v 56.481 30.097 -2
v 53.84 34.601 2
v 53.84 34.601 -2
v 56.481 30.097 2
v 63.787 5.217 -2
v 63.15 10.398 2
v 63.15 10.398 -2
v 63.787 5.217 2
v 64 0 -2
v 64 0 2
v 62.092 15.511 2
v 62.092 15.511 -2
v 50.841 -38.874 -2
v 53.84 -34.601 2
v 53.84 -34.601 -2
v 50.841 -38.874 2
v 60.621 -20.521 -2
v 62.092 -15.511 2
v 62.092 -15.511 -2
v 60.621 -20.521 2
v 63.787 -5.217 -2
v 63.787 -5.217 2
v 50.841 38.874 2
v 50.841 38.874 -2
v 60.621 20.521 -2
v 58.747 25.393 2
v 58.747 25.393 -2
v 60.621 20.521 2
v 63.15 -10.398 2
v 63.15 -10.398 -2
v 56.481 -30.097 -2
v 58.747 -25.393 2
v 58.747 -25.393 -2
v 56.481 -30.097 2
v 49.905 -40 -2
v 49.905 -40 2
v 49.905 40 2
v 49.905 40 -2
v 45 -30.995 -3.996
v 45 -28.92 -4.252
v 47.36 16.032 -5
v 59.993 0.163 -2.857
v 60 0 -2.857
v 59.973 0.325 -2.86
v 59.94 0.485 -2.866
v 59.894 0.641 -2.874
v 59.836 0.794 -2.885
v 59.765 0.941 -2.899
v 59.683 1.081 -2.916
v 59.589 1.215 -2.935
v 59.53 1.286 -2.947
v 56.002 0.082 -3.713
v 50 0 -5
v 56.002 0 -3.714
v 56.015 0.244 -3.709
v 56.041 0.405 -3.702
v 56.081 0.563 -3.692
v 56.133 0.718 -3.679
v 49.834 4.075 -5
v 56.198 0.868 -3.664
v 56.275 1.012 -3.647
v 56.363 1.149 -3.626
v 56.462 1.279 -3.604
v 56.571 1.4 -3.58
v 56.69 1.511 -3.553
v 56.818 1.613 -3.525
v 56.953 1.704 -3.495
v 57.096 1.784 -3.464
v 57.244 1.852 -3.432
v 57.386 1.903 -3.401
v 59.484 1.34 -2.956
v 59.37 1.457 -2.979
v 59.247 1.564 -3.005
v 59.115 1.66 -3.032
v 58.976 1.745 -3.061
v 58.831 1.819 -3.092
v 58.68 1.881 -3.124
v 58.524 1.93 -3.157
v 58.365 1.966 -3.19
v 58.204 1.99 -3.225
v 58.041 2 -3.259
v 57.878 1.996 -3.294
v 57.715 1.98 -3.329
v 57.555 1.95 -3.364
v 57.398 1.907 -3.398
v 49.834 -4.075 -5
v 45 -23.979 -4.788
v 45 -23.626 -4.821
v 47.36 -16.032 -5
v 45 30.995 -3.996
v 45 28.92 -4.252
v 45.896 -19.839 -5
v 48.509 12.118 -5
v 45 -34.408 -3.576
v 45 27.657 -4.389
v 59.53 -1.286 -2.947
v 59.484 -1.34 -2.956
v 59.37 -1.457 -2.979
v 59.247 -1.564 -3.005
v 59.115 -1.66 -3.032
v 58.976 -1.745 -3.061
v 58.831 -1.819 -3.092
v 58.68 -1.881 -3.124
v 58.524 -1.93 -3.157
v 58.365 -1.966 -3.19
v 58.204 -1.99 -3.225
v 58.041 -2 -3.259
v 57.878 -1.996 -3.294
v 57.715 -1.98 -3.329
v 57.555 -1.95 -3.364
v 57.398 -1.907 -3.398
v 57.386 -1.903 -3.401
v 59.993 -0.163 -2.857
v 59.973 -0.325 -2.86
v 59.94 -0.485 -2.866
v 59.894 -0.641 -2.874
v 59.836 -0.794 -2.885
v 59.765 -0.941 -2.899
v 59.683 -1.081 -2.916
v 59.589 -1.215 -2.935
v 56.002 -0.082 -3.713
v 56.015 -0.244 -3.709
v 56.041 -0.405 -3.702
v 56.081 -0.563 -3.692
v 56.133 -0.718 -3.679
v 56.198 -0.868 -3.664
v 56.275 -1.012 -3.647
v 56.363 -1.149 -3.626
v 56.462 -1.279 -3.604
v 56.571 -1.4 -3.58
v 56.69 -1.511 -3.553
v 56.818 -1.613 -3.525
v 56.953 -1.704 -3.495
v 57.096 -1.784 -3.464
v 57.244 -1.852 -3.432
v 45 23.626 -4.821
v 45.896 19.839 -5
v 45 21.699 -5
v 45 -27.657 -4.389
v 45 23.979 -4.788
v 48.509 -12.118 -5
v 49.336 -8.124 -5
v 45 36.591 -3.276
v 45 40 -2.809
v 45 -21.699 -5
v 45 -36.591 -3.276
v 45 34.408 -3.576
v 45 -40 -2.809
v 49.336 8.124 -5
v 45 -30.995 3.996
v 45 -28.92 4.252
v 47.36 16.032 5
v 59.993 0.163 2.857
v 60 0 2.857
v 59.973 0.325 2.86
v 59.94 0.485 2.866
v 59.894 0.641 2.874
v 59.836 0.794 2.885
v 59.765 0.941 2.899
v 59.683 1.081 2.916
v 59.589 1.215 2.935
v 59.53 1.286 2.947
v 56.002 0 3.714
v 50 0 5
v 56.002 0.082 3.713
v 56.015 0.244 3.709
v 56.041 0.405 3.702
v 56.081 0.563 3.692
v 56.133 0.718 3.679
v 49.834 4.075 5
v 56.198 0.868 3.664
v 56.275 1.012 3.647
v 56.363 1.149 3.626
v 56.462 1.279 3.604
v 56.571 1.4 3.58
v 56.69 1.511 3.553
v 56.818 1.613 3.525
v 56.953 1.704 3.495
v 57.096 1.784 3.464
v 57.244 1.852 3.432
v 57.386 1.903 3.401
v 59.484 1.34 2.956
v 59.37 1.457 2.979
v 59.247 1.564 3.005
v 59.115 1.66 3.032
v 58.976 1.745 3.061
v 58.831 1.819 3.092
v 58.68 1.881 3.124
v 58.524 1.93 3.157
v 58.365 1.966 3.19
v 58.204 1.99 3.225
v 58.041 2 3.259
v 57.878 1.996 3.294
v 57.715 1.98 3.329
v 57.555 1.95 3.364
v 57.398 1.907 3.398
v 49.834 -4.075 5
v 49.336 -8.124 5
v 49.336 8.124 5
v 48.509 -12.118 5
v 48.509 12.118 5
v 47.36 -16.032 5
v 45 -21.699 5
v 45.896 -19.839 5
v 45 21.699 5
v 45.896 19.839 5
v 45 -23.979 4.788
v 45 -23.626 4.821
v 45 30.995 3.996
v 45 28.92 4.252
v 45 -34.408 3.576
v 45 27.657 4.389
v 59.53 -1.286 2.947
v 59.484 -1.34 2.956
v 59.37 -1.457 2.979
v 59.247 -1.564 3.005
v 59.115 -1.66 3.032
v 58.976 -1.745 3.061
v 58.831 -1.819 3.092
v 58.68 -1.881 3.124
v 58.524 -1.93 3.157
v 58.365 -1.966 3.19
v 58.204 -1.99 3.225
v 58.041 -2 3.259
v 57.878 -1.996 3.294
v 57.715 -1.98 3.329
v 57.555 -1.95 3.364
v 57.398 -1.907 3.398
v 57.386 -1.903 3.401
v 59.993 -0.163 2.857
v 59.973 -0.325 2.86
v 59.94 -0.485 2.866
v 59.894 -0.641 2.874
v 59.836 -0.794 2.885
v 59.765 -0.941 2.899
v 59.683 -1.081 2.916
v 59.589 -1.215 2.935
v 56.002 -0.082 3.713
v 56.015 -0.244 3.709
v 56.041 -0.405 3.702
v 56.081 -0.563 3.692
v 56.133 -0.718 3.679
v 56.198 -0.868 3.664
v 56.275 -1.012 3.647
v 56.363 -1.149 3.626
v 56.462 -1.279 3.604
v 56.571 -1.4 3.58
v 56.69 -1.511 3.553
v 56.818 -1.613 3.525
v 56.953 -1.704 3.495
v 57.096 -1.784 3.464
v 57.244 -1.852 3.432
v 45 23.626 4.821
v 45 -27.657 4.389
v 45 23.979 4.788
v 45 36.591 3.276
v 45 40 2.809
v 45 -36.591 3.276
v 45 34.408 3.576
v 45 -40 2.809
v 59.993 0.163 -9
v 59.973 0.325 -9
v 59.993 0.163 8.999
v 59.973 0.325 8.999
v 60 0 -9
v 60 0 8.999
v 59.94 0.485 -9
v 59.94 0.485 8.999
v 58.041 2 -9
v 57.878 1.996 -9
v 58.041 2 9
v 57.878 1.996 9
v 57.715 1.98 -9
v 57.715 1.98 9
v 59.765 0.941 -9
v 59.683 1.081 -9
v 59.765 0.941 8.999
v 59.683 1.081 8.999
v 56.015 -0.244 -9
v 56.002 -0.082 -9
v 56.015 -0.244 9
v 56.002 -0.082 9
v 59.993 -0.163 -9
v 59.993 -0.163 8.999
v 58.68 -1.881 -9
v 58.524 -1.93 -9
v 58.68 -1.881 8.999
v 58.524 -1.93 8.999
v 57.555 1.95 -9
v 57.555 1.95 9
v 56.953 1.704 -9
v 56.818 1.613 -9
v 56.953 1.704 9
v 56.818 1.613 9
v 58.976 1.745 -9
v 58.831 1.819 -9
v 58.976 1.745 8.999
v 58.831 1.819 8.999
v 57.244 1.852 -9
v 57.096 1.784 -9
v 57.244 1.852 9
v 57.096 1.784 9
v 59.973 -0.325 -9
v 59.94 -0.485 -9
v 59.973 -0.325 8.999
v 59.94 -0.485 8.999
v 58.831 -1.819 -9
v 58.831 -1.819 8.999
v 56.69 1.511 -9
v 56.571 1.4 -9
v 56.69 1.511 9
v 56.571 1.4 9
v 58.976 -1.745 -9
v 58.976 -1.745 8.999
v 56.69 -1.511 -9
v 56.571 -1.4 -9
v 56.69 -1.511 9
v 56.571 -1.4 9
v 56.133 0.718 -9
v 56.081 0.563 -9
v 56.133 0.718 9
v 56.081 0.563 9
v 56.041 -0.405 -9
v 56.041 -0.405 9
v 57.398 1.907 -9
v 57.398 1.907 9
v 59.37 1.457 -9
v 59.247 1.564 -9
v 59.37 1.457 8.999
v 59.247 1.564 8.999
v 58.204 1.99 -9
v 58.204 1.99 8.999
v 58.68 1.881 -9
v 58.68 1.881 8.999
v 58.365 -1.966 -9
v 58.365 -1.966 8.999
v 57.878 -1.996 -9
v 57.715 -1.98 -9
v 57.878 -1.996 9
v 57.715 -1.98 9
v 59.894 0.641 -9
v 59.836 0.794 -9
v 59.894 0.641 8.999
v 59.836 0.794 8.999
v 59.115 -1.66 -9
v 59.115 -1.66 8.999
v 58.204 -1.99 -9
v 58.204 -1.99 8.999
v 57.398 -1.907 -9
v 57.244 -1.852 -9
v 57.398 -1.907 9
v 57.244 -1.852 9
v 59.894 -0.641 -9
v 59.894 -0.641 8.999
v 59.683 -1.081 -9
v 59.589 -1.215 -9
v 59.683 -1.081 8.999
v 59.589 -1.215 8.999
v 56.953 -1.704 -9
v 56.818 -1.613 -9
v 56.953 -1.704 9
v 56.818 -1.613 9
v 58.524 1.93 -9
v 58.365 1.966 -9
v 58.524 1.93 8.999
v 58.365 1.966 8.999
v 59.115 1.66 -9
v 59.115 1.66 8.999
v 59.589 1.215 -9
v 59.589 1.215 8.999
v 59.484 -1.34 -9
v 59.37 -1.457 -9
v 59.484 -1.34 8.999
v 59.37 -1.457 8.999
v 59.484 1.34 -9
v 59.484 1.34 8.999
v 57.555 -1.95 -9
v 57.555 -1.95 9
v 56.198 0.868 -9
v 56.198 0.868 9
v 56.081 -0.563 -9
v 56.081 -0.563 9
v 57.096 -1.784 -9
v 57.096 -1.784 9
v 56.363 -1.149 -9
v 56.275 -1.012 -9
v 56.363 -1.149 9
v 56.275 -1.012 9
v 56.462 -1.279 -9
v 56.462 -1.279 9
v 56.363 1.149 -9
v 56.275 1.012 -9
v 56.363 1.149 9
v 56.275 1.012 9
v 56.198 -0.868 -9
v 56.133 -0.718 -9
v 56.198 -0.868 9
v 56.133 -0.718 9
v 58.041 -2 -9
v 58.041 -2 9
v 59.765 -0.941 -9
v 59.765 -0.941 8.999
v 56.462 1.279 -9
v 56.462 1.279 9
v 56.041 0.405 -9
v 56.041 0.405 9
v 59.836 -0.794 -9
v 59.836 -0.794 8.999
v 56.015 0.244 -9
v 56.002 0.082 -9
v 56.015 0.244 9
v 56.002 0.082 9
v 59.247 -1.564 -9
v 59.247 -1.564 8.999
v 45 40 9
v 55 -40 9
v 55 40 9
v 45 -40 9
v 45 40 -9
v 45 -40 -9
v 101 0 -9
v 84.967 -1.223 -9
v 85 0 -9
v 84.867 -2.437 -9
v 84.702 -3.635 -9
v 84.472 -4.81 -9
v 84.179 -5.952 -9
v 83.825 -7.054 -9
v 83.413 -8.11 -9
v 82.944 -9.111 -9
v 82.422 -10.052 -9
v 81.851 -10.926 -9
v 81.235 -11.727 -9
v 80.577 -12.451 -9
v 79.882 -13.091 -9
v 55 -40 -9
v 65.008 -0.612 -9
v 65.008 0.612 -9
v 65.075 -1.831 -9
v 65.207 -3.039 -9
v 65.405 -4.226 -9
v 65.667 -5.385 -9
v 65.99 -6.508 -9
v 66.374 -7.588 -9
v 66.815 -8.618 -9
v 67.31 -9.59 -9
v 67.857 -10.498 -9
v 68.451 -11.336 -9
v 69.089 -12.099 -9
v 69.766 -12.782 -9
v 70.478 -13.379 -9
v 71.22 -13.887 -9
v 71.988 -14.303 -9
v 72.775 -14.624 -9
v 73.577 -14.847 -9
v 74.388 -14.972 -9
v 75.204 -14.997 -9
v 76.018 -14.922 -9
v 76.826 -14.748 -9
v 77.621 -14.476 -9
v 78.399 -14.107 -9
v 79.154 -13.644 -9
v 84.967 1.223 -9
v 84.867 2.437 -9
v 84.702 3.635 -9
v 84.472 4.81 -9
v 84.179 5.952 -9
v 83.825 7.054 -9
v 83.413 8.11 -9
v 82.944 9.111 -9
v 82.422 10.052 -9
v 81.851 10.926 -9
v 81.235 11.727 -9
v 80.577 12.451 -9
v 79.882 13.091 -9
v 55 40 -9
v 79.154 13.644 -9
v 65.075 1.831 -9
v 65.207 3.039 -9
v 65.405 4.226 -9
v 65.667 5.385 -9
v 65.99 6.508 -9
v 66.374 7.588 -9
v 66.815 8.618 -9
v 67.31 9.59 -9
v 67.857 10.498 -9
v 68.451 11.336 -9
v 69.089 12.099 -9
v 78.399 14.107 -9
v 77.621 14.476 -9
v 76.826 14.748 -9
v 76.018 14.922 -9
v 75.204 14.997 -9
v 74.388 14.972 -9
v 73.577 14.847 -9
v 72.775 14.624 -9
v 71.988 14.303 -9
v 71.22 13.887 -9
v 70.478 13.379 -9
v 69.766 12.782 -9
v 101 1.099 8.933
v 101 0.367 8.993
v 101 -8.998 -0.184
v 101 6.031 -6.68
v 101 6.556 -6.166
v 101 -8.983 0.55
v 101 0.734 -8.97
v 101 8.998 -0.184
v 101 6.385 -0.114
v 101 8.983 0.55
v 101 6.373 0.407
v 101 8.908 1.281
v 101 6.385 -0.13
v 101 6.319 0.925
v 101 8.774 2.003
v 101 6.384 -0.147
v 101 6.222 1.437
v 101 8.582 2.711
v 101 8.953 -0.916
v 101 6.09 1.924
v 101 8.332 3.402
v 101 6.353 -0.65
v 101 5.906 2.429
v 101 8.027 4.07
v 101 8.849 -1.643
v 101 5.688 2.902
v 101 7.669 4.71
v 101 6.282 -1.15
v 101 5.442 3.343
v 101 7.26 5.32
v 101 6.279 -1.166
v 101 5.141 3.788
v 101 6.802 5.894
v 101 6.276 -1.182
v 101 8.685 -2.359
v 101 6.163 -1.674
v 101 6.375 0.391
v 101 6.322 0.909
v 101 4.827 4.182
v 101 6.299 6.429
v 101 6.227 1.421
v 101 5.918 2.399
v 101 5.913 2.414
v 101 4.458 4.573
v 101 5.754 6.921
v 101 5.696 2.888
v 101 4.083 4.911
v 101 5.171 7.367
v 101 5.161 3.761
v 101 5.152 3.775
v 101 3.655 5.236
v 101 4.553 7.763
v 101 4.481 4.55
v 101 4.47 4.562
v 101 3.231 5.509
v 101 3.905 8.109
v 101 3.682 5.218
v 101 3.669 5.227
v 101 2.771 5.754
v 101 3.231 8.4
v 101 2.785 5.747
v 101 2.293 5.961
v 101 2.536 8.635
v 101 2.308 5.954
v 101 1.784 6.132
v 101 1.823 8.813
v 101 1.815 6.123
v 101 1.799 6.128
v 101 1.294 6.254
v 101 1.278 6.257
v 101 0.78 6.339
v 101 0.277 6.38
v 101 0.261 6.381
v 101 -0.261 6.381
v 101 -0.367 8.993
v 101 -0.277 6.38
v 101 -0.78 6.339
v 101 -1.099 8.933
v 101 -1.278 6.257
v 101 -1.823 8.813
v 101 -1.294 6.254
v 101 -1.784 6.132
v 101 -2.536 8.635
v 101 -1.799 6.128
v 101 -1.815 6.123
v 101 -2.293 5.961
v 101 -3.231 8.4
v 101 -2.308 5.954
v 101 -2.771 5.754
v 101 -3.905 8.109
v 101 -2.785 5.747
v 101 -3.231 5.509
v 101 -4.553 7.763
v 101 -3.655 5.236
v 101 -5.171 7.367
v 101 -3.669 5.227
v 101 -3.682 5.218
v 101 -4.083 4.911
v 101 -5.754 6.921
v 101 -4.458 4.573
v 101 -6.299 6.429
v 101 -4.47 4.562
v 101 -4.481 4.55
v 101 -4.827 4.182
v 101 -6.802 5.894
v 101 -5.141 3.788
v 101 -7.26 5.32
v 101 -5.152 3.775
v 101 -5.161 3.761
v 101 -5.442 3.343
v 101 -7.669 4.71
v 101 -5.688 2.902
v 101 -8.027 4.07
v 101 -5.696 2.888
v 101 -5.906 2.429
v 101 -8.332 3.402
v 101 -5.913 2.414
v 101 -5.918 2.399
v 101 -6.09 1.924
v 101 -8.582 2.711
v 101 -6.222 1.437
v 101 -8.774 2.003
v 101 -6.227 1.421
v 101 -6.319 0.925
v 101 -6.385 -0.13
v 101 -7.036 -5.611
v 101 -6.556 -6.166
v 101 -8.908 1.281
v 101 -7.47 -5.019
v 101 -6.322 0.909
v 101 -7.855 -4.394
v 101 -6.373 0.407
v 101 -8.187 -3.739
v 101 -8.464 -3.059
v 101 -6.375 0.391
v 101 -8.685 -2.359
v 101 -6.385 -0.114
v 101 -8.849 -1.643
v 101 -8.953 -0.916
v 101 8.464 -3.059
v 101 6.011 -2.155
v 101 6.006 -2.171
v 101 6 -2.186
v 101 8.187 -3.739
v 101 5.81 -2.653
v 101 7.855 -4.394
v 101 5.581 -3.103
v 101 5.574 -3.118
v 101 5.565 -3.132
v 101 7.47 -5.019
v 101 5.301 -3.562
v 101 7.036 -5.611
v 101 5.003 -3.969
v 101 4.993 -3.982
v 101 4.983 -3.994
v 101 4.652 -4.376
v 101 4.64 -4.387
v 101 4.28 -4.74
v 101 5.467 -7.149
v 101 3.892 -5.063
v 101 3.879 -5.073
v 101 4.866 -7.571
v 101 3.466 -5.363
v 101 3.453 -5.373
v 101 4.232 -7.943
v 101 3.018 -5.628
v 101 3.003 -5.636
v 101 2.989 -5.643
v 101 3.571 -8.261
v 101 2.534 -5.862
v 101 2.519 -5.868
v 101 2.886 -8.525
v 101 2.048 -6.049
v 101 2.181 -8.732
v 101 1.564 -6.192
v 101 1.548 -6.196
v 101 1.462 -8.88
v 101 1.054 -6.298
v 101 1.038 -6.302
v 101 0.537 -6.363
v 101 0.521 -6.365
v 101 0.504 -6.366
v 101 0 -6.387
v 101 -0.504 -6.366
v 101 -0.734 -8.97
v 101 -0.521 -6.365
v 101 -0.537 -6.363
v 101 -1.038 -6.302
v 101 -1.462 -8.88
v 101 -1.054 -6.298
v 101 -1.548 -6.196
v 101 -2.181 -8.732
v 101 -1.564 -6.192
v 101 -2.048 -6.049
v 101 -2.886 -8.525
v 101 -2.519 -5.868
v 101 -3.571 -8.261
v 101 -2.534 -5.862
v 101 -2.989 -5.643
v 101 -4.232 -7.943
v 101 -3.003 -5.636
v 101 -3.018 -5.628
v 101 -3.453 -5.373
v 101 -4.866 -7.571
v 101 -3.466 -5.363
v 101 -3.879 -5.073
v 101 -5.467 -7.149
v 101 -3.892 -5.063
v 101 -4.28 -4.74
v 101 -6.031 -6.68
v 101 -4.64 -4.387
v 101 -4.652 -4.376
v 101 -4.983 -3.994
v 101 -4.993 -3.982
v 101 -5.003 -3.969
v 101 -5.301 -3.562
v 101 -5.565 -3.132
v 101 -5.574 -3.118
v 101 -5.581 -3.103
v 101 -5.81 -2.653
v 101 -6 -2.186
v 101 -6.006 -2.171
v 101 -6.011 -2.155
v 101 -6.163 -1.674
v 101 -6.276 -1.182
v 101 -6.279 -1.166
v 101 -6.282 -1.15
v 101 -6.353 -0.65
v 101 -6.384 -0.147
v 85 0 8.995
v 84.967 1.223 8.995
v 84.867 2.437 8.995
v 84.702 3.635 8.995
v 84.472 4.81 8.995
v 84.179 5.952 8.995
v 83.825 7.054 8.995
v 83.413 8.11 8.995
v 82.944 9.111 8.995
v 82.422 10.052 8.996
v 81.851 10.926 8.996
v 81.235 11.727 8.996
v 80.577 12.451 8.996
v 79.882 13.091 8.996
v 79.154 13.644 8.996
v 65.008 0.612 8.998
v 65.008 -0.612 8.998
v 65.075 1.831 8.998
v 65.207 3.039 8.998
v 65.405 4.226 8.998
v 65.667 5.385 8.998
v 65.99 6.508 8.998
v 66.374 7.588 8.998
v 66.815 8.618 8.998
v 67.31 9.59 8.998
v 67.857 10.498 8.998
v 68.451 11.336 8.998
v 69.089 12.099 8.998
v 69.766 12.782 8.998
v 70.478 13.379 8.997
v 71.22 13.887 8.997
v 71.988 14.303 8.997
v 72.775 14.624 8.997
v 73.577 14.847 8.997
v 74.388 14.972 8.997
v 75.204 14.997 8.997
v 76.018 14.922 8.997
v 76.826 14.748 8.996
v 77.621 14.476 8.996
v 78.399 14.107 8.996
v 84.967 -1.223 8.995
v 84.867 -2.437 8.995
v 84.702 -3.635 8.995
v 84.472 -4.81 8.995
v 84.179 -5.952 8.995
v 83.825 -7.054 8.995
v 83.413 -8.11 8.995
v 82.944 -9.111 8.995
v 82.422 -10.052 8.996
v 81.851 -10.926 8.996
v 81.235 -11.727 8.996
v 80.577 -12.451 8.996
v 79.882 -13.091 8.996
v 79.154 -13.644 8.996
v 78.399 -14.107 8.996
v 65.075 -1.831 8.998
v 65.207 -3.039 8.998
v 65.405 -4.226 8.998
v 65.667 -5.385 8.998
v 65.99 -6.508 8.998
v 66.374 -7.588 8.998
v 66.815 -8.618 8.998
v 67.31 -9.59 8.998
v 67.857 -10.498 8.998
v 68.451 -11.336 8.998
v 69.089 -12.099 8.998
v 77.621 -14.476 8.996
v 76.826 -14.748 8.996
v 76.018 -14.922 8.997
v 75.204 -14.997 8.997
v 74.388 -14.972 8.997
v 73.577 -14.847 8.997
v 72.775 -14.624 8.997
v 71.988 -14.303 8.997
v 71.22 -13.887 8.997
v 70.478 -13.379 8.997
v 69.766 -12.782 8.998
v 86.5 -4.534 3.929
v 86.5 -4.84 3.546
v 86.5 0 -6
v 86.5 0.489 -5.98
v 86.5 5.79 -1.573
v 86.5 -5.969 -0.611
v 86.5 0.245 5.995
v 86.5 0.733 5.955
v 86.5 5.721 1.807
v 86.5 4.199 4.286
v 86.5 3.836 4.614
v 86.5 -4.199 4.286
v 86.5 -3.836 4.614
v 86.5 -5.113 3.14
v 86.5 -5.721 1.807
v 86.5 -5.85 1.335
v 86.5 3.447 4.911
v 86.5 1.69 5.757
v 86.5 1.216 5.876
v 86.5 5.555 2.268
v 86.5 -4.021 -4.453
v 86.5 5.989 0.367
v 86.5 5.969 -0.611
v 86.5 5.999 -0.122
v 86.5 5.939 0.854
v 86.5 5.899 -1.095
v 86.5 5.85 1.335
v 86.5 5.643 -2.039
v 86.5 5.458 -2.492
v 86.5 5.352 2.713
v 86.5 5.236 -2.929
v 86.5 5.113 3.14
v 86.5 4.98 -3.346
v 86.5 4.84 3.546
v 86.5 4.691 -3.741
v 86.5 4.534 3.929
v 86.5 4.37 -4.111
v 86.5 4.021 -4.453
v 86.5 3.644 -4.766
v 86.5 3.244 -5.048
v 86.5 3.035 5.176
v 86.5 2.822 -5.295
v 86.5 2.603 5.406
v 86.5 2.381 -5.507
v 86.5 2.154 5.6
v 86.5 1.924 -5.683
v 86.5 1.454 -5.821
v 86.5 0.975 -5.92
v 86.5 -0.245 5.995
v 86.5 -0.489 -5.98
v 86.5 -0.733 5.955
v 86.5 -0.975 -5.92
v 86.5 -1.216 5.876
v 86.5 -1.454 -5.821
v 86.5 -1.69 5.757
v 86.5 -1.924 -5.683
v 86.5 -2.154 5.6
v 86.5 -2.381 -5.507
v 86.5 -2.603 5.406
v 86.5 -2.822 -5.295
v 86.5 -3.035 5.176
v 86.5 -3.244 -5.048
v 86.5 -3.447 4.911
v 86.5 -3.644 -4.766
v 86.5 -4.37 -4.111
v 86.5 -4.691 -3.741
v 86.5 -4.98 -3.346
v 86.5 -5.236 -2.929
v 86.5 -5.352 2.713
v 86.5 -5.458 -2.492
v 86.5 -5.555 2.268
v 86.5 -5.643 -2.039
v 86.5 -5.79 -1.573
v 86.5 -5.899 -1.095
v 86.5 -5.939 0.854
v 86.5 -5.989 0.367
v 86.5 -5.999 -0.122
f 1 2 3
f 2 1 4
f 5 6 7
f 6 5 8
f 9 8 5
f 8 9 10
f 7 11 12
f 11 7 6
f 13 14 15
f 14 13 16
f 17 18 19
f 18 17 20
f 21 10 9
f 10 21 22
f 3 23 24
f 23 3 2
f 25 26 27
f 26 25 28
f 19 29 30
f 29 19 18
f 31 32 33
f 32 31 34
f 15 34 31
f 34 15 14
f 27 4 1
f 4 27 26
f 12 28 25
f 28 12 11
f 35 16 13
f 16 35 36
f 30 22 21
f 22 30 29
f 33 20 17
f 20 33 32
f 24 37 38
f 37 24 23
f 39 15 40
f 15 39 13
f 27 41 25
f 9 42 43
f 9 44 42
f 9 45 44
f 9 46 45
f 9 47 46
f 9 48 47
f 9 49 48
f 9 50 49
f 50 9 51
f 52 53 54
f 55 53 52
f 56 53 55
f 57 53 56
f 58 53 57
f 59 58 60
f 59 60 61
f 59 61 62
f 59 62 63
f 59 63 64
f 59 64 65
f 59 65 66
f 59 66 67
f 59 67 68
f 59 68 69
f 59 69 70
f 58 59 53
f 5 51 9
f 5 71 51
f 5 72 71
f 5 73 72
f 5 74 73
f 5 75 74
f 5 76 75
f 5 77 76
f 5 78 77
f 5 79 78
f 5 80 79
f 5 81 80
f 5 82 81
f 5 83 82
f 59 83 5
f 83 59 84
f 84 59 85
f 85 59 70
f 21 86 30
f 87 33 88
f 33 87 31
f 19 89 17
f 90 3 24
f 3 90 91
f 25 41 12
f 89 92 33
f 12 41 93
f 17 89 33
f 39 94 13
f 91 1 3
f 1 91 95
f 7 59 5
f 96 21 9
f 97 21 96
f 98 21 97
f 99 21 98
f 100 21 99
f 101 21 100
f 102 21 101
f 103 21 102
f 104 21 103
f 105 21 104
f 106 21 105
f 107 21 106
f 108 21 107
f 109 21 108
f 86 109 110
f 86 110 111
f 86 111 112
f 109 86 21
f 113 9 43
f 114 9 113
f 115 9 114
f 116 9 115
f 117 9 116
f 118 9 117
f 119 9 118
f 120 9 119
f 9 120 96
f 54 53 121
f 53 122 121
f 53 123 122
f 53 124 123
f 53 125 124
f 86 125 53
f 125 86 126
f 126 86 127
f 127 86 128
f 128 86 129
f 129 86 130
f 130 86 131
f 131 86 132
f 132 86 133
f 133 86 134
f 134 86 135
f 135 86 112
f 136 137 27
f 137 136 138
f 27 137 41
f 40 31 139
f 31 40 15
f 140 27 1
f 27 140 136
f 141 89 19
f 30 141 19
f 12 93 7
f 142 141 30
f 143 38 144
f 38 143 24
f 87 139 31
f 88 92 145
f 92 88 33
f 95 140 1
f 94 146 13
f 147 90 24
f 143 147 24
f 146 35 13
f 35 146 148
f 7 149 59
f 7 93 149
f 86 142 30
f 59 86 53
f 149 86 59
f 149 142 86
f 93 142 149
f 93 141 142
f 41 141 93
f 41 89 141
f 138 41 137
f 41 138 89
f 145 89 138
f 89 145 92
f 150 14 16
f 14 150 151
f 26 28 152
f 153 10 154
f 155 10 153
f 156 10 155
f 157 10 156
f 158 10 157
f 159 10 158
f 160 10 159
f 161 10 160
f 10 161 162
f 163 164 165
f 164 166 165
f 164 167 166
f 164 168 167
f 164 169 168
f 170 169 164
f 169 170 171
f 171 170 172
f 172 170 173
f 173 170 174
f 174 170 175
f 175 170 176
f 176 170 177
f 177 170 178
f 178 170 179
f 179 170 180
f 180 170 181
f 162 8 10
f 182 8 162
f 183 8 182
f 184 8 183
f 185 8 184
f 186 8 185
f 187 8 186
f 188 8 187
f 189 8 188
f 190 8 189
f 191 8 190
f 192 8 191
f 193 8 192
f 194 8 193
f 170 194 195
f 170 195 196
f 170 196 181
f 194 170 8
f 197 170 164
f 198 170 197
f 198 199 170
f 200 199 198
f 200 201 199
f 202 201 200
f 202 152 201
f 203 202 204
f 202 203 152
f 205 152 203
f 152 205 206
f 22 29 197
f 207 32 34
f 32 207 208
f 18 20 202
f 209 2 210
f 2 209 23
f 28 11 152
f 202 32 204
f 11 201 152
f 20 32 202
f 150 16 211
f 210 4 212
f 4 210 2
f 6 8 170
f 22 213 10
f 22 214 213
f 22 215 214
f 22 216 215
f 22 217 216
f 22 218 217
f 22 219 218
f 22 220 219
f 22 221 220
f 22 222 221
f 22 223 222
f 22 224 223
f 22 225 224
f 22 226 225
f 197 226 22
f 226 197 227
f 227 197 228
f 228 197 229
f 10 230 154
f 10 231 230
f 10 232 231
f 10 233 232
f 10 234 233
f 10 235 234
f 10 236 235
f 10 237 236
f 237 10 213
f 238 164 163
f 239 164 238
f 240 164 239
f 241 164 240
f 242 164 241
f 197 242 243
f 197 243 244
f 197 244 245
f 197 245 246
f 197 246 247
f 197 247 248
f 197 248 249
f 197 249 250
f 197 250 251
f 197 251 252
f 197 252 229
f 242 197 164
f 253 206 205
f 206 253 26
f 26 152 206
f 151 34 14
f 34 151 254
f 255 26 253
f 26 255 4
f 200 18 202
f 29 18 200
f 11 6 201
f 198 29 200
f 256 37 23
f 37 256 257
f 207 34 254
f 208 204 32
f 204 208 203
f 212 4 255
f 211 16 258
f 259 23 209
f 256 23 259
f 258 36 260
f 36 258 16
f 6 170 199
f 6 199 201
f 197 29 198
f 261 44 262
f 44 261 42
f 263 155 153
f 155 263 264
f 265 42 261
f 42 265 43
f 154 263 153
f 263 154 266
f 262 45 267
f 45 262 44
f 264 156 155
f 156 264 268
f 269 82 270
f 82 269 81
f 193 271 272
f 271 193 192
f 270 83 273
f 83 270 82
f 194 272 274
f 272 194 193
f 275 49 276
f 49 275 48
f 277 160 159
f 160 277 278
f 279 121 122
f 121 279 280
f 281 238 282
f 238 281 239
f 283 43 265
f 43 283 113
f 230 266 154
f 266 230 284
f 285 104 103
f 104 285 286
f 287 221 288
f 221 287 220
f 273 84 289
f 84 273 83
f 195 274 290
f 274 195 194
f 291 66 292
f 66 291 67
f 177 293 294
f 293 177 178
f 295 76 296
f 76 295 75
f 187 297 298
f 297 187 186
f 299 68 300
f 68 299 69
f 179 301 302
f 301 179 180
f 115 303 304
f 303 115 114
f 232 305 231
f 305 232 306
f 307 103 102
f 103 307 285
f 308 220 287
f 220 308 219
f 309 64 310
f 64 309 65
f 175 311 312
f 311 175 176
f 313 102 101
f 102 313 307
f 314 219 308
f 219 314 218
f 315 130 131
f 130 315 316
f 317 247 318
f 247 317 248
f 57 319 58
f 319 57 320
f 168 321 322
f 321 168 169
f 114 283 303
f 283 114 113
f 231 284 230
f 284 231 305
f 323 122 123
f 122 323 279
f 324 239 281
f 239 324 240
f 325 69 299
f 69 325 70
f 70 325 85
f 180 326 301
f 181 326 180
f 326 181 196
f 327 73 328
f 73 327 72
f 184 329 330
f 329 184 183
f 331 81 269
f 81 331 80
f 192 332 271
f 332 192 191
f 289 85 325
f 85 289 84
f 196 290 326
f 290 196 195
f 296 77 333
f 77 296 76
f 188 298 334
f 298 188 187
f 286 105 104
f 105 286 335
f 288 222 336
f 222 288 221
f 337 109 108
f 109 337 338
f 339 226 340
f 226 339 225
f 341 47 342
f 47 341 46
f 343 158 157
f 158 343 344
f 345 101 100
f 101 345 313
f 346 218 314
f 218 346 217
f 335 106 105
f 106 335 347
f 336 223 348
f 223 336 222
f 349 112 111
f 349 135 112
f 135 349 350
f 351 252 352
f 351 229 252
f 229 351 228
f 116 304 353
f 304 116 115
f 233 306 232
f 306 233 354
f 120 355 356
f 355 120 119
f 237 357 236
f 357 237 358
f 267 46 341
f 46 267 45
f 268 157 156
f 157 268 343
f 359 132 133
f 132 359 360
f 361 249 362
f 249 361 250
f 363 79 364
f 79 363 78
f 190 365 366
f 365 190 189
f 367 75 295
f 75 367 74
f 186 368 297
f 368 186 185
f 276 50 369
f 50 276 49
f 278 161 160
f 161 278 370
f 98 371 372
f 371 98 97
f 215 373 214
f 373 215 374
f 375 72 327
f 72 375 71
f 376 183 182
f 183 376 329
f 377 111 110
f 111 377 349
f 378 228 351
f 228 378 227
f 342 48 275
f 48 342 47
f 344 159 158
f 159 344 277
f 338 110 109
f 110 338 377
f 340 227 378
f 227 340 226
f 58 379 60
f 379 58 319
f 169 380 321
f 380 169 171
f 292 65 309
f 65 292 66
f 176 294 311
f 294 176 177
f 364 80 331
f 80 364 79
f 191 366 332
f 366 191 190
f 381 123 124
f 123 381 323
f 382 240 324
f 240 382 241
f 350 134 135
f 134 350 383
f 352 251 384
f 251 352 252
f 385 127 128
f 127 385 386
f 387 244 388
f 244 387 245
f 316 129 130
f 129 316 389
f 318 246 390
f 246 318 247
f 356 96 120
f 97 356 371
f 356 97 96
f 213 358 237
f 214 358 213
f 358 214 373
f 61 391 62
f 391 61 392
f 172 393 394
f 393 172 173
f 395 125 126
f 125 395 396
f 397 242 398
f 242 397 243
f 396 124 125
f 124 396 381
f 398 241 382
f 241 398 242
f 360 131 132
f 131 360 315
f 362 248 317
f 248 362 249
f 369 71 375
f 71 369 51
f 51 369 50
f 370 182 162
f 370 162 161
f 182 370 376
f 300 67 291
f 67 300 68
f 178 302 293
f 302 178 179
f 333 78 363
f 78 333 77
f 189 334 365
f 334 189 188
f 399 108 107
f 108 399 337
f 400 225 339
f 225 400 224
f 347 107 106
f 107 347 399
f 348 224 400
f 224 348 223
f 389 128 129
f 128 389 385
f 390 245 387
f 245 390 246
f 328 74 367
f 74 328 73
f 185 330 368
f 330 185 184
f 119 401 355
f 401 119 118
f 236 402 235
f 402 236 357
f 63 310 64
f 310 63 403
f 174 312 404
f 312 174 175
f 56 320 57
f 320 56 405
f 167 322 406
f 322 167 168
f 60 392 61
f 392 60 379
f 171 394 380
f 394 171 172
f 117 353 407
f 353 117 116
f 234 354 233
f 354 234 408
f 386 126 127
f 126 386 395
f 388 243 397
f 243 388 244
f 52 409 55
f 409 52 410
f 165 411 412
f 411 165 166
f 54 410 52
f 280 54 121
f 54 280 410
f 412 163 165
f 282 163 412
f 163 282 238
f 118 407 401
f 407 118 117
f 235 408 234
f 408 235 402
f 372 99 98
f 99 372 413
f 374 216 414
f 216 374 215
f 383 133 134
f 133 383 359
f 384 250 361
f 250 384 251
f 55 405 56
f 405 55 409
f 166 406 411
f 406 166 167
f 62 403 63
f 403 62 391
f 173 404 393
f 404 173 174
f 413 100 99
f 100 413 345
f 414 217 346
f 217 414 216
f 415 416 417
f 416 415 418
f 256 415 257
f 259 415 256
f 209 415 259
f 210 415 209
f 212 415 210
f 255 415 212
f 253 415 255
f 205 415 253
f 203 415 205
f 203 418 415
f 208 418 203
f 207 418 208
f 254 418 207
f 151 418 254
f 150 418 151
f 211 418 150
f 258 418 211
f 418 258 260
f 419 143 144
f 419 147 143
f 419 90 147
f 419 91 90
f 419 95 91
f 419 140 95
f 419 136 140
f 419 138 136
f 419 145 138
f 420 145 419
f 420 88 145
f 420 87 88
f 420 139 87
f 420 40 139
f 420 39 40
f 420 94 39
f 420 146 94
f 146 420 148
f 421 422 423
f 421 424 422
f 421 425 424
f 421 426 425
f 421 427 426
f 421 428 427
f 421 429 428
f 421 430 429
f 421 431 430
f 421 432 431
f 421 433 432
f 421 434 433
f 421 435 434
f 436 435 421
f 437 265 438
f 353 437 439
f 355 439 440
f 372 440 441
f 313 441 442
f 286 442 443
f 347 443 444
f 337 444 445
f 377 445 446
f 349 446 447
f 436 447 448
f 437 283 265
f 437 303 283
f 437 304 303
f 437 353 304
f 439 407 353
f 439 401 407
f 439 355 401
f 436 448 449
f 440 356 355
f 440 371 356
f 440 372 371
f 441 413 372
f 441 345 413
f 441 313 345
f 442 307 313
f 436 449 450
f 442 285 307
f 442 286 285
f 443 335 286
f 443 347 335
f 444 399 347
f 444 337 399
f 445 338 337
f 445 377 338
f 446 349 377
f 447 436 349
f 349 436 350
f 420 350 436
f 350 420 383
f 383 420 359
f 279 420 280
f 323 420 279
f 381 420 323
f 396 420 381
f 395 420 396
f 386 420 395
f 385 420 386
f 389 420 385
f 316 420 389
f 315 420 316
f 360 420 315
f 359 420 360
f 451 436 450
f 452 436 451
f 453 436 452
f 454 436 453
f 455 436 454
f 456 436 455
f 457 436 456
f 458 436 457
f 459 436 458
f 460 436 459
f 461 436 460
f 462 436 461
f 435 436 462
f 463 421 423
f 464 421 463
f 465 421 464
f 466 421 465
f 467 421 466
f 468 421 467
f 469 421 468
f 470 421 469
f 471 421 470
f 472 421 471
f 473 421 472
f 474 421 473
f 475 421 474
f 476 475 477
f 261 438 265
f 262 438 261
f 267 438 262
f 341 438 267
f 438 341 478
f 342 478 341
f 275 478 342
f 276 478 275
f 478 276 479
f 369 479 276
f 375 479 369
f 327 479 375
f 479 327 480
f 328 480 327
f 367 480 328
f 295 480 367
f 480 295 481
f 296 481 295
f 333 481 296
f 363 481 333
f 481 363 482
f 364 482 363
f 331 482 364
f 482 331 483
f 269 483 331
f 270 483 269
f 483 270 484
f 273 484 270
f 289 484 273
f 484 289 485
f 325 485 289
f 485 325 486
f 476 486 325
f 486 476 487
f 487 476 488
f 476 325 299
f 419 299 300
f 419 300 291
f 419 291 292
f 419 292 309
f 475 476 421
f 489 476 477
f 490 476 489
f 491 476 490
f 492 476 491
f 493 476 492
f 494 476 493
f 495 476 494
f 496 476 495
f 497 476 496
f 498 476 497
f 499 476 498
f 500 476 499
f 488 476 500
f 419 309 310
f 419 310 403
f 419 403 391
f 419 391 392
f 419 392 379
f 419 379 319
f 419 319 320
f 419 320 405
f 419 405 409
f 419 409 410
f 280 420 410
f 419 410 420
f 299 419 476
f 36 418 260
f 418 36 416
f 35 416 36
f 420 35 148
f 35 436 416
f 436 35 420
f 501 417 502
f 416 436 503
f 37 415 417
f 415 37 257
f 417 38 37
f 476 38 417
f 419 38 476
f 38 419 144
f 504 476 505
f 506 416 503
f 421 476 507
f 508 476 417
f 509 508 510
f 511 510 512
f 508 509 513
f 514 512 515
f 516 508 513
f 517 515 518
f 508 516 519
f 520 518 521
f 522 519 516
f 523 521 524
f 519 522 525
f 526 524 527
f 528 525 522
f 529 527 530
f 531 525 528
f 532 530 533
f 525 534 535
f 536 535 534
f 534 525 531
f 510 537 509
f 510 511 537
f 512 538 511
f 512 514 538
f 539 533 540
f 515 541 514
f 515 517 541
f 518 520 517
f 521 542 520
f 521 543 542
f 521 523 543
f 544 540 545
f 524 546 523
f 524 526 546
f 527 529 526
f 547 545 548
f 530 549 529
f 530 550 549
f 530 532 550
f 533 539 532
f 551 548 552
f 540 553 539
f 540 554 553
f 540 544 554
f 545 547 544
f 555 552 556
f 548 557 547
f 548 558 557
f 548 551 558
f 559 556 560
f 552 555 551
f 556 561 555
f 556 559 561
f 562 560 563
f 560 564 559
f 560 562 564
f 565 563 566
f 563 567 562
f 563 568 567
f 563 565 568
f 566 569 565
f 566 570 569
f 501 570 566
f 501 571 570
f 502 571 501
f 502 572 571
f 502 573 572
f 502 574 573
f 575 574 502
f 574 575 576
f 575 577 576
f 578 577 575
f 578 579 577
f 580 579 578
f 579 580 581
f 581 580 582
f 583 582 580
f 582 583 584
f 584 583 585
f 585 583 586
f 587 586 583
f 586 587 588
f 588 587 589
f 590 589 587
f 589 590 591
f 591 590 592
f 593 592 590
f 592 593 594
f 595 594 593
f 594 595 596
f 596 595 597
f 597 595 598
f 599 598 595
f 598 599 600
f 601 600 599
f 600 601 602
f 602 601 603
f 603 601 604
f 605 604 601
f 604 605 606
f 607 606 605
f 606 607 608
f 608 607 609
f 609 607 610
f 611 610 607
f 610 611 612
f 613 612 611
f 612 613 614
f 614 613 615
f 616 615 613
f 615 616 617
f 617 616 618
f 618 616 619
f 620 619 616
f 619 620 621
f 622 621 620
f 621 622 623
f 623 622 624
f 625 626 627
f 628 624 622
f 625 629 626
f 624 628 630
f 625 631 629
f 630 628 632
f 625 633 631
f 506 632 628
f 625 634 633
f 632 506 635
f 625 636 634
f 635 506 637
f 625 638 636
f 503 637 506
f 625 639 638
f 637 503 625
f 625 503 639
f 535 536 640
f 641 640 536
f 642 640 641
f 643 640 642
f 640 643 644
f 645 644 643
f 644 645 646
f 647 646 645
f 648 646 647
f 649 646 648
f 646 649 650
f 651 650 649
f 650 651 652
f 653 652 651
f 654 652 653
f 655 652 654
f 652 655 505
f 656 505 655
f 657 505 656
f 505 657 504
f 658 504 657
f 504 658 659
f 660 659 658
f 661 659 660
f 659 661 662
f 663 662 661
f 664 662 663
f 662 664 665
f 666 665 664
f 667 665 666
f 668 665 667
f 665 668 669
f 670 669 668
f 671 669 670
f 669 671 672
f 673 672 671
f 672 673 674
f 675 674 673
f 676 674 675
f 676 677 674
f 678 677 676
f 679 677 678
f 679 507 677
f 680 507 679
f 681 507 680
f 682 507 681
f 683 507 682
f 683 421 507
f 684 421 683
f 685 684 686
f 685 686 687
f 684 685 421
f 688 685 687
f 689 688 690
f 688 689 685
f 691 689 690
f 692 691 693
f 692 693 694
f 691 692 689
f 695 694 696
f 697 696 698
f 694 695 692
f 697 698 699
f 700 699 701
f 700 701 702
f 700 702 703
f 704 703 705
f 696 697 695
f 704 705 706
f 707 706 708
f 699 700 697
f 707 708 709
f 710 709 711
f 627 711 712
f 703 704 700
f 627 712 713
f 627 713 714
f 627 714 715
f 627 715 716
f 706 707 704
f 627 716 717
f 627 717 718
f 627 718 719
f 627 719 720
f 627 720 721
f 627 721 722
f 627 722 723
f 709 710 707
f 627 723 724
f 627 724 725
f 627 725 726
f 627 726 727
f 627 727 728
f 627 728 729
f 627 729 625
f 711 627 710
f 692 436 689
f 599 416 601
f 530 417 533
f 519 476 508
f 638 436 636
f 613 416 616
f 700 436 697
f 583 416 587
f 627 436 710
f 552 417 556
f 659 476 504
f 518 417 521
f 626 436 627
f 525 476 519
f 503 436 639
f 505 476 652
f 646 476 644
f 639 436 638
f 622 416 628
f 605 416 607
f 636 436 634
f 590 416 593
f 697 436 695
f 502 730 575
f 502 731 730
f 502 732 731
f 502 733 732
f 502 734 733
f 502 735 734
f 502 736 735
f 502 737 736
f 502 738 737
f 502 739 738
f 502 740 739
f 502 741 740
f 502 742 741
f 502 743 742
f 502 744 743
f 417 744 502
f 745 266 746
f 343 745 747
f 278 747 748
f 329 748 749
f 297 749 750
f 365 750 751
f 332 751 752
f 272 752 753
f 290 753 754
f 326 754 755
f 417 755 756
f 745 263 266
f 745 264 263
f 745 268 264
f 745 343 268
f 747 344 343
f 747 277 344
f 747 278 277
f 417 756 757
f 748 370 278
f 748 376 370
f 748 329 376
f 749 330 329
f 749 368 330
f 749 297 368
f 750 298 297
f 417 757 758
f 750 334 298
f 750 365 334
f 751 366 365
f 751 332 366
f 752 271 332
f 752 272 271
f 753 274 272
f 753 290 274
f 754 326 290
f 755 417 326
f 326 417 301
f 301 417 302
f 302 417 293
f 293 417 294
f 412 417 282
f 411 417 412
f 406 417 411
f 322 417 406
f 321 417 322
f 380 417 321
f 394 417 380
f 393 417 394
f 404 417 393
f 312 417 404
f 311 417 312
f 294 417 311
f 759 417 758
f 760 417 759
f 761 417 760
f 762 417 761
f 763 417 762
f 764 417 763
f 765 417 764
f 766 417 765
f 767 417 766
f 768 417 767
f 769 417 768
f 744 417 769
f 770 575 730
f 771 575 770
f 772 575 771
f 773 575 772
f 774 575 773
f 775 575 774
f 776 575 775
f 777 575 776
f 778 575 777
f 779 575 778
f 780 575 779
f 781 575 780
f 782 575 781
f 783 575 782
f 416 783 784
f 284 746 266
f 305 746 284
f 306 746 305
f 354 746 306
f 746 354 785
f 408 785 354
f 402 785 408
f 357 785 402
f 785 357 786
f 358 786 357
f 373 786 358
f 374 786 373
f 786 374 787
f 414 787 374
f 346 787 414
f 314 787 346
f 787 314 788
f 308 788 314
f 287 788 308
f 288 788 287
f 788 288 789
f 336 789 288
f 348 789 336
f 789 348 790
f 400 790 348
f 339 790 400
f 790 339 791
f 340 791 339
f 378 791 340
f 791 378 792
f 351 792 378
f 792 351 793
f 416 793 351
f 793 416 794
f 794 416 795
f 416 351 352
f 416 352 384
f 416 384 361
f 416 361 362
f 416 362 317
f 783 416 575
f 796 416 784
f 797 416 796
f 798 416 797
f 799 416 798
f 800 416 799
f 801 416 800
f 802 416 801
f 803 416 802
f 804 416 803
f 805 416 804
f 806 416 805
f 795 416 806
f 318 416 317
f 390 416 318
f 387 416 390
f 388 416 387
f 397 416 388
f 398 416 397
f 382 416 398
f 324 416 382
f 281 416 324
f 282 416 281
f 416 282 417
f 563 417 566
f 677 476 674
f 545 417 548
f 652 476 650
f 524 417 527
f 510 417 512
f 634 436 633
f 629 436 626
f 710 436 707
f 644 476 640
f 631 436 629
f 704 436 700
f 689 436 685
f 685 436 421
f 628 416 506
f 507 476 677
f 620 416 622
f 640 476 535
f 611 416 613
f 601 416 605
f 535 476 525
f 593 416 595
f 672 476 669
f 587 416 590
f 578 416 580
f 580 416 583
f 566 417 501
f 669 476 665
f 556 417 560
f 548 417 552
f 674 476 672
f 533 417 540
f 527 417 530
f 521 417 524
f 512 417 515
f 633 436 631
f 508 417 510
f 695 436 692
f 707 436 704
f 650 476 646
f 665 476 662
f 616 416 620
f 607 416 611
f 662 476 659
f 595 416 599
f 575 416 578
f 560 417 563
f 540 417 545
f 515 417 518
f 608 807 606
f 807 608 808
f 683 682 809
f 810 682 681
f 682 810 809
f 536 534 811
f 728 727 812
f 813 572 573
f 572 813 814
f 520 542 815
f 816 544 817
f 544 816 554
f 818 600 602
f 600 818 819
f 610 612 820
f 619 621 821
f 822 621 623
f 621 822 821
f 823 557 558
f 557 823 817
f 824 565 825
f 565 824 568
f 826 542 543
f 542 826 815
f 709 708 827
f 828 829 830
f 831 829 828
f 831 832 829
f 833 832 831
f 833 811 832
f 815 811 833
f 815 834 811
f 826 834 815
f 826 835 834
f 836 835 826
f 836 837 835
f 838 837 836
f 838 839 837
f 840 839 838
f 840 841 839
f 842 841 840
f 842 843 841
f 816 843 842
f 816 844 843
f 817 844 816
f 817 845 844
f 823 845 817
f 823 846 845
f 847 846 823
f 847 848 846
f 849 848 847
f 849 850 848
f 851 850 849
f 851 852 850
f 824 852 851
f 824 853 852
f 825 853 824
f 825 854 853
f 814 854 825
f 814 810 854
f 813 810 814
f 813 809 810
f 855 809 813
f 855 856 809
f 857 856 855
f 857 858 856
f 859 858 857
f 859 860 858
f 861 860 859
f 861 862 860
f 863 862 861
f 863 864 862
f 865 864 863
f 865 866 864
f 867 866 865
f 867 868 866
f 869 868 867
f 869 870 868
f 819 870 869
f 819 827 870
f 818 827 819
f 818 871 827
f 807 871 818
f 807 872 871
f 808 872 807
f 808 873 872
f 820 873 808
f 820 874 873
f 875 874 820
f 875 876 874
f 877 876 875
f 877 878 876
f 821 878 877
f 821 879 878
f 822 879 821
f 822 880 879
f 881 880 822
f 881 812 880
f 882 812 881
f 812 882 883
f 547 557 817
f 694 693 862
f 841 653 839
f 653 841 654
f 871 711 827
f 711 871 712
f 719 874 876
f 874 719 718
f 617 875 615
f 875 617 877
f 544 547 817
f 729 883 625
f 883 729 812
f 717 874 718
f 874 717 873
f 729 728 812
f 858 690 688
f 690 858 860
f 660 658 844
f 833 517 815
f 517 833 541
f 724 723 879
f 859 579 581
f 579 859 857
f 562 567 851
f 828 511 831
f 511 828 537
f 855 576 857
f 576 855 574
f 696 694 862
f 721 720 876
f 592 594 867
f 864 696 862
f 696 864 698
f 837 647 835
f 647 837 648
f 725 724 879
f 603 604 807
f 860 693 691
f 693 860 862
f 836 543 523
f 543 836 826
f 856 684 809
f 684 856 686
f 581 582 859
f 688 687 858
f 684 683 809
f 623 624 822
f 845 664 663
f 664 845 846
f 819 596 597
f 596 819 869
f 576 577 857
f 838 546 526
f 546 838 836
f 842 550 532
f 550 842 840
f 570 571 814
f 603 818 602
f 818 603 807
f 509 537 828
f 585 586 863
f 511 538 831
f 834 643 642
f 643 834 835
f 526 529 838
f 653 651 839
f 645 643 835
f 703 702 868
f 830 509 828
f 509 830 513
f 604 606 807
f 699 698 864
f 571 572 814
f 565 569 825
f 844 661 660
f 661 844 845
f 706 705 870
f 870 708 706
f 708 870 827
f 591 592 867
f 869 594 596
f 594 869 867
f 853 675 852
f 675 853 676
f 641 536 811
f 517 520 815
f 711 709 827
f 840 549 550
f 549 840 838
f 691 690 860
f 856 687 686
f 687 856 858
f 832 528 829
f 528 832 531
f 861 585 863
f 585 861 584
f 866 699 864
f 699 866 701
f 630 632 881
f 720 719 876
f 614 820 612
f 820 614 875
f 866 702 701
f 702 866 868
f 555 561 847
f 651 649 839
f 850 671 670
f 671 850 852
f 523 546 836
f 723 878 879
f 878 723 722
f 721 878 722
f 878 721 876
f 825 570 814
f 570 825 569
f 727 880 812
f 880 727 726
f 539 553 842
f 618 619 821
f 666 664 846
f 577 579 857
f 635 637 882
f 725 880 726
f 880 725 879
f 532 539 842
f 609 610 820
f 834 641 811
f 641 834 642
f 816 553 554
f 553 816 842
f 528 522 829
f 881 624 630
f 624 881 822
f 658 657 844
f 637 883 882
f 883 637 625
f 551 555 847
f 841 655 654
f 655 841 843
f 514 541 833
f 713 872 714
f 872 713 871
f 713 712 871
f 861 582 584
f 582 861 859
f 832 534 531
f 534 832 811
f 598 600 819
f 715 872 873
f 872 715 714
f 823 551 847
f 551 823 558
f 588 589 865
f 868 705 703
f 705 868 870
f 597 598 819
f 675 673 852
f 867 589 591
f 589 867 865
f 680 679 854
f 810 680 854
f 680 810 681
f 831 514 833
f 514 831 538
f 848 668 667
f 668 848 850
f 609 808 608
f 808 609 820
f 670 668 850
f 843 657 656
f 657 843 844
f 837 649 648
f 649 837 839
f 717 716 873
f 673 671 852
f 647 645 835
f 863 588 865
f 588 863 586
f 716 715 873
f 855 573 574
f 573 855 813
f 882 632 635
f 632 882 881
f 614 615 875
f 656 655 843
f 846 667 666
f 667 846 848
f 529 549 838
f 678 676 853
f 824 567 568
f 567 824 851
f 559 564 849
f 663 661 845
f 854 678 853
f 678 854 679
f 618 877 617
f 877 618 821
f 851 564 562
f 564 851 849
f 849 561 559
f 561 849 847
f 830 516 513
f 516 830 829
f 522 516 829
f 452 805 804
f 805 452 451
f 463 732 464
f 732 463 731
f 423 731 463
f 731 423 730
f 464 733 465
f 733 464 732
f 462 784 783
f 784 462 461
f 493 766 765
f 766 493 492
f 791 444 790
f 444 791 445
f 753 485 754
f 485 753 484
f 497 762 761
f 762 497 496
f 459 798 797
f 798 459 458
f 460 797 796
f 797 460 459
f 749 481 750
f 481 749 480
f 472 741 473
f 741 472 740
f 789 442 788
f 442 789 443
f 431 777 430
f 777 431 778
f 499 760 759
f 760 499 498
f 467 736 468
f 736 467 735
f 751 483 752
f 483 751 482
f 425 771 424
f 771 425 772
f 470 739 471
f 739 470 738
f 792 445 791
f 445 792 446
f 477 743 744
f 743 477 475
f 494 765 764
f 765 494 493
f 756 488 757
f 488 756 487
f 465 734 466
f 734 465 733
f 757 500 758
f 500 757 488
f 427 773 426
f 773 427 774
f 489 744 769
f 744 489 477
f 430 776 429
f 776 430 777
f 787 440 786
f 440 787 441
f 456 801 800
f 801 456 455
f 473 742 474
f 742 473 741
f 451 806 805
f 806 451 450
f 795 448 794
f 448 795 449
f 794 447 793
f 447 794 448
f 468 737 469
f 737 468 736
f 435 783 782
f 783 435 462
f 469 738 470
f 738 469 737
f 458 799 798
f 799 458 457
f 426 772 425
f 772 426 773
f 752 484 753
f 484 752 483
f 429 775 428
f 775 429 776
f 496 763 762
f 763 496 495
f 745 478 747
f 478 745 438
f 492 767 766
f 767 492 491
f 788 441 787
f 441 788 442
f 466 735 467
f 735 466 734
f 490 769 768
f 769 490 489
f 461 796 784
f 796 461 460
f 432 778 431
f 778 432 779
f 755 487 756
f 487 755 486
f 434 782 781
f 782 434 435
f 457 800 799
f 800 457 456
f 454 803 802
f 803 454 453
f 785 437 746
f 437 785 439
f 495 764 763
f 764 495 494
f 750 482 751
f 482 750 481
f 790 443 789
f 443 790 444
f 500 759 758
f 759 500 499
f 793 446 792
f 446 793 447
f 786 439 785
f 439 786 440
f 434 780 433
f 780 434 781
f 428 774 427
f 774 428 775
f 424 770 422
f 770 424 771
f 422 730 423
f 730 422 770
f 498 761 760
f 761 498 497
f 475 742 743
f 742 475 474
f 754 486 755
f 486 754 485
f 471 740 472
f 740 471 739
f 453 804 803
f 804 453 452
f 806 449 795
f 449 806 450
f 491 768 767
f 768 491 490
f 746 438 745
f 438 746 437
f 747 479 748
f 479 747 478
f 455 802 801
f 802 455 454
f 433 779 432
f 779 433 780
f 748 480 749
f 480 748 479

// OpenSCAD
// file: ../Parts/rounder.scad
// rounder.scad
// cutting tool for rounding off corners with a cylinder

//---------------------
module rounder(
r=10,   // radius
h=10,   // height
f=22,    // $fn
extra=0.01  // extra size for the cube
){

difference(){
  translate([-extra,-extra,-extra])
  cube([r+extra,r+extra,h+2*extra]);
  translate([r,r,-1])
  cylinder(r=r,h=h+2,$fn=f);
}

}

//---------------------------------------------------------------------------
module bevel(x=1,y=1,h=10){

linear_extrude(height=h)
polygon(points=[[0,0],[x,0],[0,y]]);
    
}
  

//========================

rounder();

//========================
// main file
//======================================================================
// Magnifier.scad
//
// magnifier stand, connect goose-neck to the glass
//
// DrTomFlint, 18 Jan 2025
//======================================================================

use <../Parts/rounder.scad>
use <../Parts/threads.scad>

F1=200;
F2=77;

//----------------------------------------------------------------------
module glass(){

  difference(){
    union(){
      cylinder(r=128/2,h=2,$fn=F2);
      translate([0,0,2])
      cylinder(r1=128/2,r2=50,h=3,$fn=F2);
      mirror([0,0,1]){
        cylinder(r=128/2,h=2,$fn=F2);
        translate([0,0,2])
        cylinder(r1=128/2,r2=50,h=3,$fn=F2);
      }
    }
    translate([58,0,0])
    cylinder(r=2,h=20,center=true,$fn=F2);
  }

}

//----------------------------------------------------------------------
module magnifier(){

  // glass clamp
  difference(){
    hull(){
      translate([50,0,0])
      cube([10,80,18],center=true);
      
      translate([100,0,0])
      rotate([0,90,0])
      cylinder(r=9,h=2,center=true,$fn=F2);
    }
    // cut for glass bolt
    translate([58,0,0])
    cylinder(r=2,h=20,center=true,$fn=F2);
  
    // cut for the glass
    glass();
    
    // cut for the goose-neck
    translate([100-6,0,0])
    rotate([0,90,0])
    cylinder(r1=6.0,r2=6.4,h=15,center=true,$fn=F2);
    
    // material reduction
    translate([75,0,0])
    scale([1,1.5,1])
    cylinder(r=10,h=30,center=true,$fn=F2);
    
  }
}

//======================================================================

//~ glass();

magnifier();


//======================================================================
